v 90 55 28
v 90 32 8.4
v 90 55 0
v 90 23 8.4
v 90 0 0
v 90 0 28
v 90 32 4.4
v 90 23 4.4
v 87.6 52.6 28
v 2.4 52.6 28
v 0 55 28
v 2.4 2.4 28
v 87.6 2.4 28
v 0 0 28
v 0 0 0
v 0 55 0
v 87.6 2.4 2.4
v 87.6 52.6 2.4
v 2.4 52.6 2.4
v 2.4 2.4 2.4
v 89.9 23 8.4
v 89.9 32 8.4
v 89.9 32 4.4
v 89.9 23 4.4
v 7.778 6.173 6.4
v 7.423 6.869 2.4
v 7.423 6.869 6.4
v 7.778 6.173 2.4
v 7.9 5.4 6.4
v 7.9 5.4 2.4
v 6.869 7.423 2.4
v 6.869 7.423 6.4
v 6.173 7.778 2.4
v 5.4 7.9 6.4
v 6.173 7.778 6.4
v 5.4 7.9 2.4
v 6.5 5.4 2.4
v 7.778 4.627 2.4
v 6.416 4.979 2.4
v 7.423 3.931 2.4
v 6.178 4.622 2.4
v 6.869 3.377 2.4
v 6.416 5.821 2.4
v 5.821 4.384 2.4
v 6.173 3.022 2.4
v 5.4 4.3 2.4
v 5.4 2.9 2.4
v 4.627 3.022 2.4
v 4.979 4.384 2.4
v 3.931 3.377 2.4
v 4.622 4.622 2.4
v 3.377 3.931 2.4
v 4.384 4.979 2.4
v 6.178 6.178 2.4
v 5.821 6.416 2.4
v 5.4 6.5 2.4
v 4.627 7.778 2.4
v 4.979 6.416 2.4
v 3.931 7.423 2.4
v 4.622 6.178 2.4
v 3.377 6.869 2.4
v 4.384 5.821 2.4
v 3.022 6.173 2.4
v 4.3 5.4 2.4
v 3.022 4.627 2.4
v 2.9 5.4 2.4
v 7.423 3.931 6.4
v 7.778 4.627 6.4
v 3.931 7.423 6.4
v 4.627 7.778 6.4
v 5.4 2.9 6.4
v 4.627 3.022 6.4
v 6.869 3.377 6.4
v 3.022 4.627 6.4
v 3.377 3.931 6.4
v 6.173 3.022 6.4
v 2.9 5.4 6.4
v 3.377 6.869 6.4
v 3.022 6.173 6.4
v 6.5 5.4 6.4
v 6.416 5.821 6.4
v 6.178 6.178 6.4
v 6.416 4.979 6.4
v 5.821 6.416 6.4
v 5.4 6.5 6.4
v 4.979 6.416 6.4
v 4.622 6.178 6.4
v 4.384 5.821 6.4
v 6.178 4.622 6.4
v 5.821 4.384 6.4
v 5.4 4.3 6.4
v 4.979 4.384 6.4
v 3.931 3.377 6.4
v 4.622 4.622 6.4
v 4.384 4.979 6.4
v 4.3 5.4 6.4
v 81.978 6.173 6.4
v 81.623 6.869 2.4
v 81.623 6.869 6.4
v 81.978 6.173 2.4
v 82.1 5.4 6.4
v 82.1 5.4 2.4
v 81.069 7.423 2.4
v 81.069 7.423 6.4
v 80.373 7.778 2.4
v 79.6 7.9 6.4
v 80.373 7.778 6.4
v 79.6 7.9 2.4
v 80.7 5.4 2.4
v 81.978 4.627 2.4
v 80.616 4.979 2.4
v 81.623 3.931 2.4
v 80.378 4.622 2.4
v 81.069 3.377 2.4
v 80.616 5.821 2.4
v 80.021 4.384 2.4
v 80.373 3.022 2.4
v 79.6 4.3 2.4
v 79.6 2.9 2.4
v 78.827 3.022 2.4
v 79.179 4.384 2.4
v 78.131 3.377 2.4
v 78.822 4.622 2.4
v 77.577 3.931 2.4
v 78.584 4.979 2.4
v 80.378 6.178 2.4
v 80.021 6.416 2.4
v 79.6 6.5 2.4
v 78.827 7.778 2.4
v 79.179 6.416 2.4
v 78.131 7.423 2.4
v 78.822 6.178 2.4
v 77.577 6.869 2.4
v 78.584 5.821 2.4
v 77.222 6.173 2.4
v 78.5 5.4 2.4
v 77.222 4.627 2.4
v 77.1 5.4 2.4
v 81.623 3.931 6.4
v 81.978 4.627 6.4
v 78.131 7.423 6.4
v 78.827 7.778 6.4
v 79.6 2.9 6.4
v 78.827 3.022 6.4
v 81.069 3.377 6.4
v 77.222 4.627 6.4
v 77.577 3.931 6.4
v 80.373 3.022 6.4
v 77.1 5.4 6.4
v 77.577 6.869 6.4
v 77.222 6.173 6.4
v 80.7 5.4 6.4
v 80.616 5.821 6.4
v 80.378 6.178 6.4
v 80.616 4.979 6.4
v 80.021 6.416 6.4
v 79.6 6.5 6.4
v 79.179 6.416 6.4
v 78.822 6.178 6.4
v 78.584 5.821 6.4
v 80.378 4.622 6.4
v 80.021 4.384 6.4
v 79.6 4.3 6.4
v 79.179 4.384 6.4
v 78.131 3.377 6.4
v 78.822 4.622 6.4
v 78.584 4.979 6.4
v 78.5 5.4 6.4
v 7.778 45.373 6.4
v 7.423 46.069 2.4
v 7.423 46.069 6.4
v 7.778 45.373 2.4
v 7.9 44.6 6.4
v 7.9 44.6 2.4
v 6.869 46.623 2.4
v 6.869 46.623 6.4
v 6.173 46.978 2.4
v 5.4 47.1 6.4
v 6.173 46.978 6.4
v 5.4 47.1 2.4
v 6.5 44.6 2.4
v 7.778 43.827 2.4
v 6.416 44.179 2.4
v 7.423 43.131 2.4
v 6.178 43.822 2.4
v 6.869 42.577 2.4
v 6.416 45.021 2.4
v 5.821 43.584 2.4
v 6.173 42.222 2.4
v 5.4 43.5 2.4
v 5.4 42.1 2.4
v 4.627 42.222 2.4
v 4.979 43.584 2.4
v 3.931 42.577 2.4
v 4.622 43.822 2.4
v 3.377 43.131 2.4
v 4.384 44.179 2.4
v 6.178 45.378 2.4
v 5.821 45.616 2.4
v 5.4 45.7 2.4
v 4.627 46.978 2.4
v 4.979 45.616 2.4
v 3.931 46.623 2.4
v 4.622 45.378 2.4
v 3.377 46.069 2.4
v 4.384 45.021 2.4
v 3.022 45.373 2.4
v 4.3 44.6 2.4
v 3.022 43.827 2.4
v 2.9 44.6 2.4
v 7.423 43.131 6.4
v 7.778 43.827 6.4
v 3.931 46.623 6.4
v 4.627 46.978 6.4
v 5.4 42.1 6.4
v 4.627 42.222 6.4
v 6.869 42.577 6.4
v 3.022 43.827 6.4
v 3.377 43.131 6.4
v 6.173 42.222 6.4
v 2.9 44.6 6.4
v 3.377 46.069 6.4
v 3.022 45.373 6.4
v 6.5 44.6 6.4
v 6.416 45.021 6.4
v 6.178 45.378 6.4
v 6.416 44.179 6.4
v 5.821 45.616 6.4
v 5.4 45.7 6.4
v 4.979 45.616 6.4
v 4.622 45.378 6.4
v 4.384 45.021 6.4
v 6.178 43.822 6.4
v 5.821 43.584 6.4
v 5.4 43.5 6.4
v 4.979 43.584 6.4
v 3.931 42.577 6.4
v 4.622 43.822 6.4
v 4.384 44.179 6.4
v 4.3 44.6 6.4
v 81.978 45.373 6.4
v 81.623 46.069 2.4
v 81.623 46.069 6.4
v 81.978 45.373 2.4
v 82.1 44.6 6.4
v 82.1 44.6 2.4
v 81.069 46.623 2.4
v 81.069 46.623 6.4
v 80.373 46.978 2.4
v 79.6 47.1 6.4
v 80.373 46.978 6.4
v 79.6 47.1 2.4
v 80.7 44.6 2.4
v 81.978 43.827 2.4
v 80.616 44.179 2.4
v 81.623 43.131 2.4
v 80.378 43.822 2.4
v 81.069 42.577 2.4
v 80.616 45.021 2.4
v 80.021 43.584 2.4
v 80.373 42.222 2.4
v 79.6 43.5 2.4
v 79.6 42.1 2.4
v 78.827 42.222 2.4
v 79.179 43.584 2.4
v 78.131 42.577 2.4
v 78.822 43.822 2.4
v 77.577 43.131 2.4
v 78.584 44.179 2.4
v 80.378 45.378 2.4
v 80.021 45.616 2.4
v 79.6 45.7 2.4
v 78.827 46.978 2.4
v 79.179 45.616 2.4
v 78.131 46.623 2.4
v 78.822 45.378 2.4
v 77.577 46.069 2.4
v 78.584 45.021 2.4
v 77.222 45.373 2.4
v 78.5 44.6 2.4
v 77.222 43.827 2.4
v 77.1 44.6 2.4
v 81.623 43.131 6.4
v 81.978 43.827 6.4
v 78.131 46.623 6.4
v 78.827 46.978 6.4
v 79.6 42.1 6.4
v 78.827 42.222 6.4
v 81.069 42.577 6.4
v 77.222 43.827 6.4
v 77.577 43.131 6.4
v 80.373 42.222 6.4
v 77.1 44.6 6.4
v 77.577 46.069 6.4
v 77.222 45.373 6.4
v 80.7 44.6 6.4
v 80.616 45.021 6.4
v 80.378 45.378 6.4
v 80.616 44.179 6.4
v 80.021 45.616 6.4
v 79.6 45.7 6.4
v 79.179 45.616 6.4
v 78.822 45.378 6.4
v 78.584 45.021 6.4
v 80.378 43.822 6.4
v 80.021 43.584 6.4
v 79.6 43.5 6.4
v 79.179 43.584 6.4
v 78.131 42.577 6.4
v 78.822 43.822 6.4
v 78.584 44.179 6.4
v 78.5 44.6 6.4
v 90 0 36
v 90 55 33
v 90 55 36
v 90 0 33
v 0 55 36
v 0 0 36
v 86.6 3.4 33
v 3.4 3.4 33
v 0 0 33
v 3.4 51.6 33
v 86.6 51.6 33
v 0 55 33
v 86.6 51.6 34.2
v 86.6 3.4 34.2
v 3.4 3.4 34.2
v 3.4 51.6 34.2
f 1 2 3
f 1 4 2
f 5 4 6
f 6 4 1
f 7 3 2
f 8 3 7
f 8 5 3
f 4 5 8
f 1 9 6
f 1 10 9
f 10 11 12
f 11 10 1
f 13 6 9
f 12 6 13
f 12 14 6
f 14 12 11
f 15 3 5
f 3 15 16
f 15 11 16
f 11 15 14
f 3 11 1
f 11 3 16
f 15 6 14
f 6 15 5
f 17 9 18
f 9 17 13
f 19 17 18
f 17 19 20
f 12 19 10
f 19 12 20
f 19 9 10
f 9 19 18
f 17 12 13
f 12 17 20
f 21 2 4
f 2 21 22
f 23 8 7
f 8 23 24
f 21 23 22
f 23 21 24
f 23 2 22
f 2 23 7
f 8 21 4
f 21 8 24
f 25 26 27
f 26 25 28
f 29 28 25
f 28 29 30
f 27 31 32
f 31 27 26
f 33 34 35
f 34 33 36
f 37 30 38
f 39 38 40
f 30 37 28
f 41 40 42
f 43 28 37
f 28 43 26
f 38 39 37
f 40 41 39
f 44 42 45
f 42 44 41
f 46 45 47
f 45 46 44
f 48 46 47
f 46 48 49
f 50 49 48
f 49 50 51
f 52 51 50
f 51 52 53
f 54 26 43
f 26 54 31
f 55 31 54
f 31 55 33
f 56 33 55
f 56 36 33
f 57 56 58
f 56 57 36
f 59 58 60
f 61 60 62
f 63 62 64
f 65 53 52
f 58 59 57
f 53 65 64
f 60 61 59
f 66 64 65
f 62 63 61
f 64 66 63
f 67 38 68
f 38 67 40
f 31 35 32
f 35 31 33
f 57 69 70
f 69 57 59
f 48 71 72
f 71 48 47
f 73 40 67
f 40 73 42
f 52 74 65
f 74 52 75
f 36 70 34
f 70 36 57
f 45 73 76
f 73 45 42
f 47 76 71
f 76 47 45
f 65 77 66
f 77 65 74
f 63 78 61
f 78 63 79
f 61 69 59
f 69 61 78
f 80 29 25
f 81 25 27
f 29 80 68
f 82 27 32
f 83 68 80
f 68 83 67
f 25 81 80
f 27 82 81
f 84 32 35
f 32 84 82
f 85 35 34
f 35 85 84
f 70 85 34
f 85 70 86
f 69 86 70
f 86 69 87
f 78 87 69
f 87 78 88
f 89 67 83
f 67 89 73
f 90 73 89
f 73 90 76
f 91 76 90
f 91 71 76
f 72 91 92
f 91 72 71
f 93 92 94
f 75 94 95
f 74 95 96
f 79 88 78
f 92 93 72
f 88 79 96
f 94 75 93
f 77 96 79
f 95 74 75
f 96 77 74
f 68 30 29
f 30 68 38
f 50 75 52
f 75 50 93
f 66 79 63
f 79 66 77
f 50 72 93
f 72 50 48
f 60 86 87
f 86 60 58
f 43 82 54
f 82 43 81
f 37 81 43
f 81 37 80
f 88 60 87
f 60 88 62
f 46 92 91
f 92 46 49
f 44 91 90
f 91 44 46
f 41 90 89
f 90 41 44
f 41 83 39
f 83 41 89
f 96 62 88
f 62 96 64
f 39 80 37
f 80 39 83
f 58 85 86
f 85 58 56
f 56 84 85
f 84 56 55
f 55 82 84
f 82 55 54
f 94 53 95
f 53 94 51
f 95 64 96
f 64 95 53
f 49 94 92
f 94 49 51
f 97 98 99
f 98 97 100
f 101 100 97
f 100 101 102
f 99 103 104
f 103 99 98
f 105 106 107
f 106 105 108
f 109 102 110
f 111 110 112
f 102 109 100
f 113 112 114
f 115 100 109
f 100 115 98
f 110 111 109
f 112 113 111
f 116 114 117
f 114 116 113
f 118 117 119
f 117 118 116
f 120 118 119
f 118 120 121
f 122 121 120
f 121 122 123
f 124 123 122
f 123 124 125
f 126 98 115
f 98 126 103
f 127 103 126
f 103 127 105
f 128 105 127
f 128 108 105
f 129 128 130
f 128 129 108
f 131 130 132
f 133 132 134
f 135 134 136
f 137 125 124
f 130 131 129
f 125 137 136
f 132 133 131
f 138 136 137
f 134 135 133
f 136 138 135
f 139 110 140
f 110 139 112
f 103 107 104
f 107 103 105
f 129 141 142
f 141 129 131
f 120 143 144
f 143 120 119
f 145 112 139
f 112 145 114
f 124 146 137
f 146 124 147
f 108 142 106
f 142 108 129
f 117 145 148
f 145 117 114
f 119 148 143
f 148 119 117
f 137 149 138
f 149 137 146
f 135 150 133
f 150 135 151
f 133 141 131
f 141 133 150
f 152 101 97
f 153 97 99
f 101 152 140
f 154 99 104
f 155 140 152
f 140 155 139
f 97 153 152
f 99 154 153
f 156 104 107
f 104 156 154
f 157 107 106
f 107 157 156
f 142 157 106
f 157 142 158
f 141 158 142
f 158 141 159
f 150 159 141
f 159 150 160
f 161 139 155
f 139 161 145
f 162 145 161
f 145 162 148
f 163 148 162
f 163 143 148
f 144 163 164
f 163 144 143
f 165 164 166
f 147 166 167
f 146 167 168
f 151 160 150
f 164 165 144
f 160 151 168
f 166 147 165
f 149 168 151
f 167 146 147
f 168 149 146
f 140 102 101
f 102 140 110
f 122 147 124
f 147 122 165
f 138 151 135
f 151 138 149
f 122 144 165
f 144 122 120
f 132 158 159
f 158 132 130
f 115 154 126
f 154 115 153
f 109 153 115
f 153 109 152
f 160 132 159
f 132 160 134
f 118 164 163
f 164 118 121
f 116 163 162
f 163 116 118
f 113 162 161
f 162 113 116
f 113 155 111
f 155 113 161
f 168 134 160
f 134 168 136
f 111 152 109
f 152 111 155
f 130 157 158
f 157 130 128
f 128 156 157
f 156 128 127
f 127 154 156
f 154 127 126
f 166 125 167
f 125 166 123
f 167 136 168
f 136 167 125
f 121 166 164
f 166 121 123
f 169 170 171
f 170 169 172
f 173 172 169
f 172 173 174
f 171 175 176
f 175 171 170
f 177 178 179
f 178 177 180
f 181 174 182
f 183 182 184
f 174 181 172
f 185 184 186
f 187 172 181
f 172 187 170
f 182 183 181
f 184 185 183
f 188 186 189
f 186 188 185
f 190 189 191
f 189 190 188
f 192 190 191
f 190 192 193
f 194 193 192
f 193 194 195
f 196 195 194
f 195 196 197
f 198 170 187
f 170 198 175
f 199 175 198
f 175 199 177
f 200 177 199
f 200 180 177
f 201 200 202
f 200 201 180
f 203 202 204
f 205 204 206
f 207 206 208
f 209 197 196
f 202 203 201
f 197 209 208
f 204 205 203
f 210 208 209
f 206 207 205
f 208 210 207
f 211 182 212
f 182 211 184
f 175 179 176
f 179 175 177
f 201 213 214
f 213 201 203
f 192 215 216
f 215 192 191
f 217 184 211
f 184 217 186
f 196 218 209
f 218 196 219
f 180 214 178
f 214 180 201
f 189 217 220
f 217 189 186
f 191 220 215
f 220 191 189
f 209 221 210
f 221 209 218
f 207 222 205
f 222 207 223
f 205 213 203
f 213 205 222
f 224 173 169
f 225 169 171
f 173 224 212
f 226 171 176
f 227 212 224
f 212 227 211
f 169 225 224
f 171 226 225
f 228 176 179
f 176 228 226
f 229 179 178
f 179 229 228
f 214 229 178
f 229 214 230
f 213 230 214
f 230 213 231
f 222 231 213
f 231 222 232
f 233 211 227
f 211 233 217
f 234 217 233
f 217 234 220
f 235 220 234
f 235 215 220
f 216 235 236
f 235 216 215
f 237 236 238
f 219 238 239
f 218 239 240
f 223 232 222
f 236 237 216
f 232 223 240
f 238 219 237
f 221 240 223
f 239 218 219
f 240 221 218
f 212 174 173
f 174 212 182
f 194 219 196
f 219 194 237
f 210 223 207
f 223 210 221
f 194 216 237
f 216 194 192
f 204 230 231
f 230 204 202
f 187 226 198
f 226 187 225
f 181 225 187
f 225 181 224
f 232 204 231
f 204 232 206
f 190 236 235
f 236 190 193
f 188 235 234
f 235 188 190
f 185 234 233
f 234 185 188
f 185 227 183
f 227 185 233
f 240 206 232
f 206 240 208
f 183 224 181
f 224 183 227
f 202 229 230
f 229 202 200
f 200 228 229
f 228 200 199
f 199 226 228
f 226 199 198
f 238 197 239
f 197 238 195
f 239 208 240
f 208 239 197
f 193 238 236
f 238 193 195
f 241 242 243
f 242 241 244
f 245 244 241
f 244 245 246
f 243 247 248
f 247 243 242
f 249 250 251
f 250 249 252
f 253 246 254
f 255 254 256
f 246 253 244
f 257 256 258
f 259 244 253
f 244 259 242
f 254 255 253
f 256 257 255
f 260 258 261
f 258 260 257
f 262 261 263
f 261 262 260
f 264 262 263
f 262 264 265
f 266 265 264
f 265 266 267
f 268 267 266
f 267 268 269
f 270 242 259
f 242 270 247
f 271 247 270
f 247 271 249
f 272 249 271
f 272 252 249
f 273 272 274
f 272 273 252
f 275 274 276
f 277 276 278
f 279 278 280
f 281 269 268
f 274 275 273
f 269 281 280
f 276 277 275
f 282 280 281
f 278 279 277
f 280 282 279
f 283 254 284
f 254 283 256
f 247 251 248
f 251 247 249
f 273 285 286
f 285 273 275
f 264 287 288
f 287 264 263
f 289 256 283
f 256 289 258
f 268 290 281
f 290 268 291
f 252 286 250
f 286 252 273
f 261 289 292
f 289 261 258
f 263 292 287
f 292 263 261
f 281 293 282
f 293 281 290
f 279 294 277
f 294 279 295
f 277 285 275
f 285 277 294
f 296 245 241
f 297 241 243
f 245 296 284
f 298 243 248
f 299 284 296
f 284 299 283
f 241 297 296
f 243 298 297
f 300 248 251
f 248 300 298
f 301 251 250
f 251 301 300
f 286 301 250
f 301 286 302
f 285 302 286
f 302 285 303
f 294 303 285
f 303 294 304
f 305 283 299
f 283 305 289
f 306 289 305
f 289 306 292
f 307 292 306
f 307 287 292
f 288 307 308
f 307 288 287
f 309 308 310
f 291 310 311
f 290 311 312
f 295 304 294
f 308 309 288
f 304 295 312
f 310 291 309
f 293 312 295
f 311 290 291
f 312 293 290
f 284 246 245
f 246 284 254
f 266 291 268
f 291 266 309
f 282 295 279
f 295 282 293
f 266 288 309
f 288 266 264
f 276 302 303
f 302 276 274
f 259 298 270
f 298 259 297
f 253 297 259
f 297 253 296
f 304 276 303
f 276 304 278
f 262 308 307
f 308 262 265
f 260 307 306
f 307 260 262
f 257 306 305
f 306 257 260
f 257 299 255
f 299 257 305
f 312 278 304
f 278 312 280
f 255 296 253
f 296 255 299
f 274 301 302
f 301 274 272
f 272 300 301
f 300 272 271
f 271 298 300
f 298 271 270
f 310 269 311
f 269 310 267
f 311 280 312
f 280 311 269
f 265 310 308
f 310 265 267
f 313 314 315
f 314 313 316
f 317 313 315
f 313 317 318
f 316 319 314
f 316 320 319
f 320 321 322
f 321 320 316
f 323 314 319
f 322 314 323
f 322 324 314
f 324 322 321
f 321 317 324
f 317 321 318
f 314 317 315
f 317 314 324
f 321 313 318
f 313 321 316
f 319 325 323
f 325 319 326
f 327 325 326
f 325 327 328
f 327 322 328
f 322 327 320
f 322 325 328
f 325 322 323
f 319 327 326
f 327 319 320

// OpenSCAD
// Nod Button Box — 3 buttons (Yes / Yes-Always / No)
// Arduino Nano Every + SSD1306 OLED 0.91" + 3x 12mm tactile buttons
// Print with 0.2mm layer height, 3 walls, 15% infill

// ── Tunables ───────────────────────────────────────────────────────────
box_w       = 90;   // mm width
box_d       = 55;   // mm depth
box_h       = 28;   // mm height (body)
wall        = 2.4;  // wall thickness
lid_h       = 3.0;  // lid thickness
btn_d       = 12.5; // button hole diameter
btn_y       = 32;   // Y position of button row from front
oled_w      = 27.0; // OLED cutout width
oled_h      = 12.0; // OLED cutout height
oled_x      = (box_w - oled_w) / 2;
oled_y      = 8;    // from front
usb_w       = 9.0;  // USB-C cutout width
usb_h       = 4.0;
nano_offset = 5;    // from right wall

// Button X positions (evenly spaced, 3 buttons)
btn_x = [box_w * 0.22, box_w * 0.50, box_w * 0.78];

// ── Bottom shell ───────────────────────────────────────────────────────
module bottom_shell() {
  difference() {
    // Outer box
    cube([box_w, box_d, box_h]);

    // Inner cavity
    translate([wall, wall, wall])
      cube([box_w - 2*wall, box_d - 2*wall, box_h]);

    // Button holes (top face)
    for (x = btn_x) {
      translate([x, btn_y, box_h - 0.1])
        cylinder(h = wall + 0.2, d = btn_d, $fn = 40);
    }

    // OLED window (top face)
    translate([oled_x, oled_y, box_h - 0.1])
      cube([oled_w, oled_h, wall + 0.2]);

    // USB-C cutout (right side, near bottom)
    translate([box_w - 0.1, (box_d - usb_w) / 2, wall + 2])
      cube([wall + 0.2, usb_w, usb_h]);

    // Lid snap groove (top rim, 1mm × 1mm)
    translate([wall + 1, wall + 1, box_h - 1])
      cube([box_w - 2*wall - 2, box_d - 2*wall - 2, 1.2]);
  }

  // PCB standoffs (M2, 4 corners)
  standoff_h = 4;
  standoff_d = 5;
  standoff_positions = [
    [wall + 3, wall + 3],
    [box_w - wall - 3 - standoff_d, wall + 3],
    [wall + 3, box_d - wall - 3 - standoff_d],
    [box_w - wall - 3 - standoff_d, box_d - wall - 3 - standoff_d],
  ];
  for (p = standoff_positions) {
    translate([p[0], p[1], wall])
      difference() {
        cylinder(h = standoff_h, d = standoff_d, $fn = 20);
        cylinder(h = standoff_h + 0.1, d = 2.2, $fn = 16); // M2 hole
      }
  }
}

// ── Button labels (embossed, printed separately or etched) ─────────────
// Yes = left (green LED), Yes-Always = centre (yellow), No = right (red)
label_texts = ["YES", "ALWAYS", "NO"];

// ── Lid (snap-fit top) ─────────────────────────────────────────────────
module lid() {
  translate([0, 0, box_h + 5]) { // print separately
    difference() {
      cube([box_w, box_d, lid_h]);
      // Snap lip
      translate([wall + 1, wall + 1, -0.1])
        cube([box_w - 2*wall - 2, box_d - 2*wall - 2, 1.3]);
    }
  }
}

// ── Button cap (print 3× in green/yellow/red filament) ────────────────
module button_cap() {
  cap_d  = 11.5;
  cap_h  = 8;
  stem_d = 6.5;
  stem_h = 4;
  translate([0, 0, 110]) { // offset so they print separately
    difference() {
      union() {
        cylinder(h = cap_h - 2, d = cap_d, $fn = 32);
        translate([0, 0, cap_h - 2])
          cylinder(h = 2, d1 = cap_d, d2 = cap_d - 2, $fn = 32); // chamfer
      }
      translate([0, 0, -0.1])
        cylinder(h = stem_h + 0.1, d = stem_d, $fn = 24); // stem socket
    }
  }
}

// ── Render ─────────────────────────────────────────────────────────────
bottom_shell();
lid();

// Uncomment to preview button caps:
// for (i = [0:2]) translate([btn_x[i], btn_y, 0]) button_cap();
